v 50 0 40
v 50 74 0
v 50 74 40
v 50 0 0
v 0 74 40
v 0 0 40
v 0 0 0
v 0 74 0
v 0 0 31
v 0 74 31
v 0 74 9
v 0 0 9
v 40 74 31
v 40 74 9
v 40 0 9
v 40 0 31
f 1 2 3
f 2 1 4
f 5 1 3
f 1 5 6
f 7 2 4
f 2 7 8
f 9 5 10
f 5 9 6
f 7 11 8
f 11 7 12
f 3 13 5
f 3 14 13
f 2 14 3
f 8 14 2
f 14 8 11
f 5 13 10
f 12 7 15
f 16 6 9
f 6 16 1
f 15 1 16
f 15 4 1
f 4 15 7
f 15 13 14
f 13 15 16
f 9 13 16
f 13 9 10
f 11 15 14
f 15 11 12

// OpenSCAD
difference() {
    cube([50,74,40]);
    translate([-1, -1, 9]) {
        cube([41, 76, 22]);
    }
}
